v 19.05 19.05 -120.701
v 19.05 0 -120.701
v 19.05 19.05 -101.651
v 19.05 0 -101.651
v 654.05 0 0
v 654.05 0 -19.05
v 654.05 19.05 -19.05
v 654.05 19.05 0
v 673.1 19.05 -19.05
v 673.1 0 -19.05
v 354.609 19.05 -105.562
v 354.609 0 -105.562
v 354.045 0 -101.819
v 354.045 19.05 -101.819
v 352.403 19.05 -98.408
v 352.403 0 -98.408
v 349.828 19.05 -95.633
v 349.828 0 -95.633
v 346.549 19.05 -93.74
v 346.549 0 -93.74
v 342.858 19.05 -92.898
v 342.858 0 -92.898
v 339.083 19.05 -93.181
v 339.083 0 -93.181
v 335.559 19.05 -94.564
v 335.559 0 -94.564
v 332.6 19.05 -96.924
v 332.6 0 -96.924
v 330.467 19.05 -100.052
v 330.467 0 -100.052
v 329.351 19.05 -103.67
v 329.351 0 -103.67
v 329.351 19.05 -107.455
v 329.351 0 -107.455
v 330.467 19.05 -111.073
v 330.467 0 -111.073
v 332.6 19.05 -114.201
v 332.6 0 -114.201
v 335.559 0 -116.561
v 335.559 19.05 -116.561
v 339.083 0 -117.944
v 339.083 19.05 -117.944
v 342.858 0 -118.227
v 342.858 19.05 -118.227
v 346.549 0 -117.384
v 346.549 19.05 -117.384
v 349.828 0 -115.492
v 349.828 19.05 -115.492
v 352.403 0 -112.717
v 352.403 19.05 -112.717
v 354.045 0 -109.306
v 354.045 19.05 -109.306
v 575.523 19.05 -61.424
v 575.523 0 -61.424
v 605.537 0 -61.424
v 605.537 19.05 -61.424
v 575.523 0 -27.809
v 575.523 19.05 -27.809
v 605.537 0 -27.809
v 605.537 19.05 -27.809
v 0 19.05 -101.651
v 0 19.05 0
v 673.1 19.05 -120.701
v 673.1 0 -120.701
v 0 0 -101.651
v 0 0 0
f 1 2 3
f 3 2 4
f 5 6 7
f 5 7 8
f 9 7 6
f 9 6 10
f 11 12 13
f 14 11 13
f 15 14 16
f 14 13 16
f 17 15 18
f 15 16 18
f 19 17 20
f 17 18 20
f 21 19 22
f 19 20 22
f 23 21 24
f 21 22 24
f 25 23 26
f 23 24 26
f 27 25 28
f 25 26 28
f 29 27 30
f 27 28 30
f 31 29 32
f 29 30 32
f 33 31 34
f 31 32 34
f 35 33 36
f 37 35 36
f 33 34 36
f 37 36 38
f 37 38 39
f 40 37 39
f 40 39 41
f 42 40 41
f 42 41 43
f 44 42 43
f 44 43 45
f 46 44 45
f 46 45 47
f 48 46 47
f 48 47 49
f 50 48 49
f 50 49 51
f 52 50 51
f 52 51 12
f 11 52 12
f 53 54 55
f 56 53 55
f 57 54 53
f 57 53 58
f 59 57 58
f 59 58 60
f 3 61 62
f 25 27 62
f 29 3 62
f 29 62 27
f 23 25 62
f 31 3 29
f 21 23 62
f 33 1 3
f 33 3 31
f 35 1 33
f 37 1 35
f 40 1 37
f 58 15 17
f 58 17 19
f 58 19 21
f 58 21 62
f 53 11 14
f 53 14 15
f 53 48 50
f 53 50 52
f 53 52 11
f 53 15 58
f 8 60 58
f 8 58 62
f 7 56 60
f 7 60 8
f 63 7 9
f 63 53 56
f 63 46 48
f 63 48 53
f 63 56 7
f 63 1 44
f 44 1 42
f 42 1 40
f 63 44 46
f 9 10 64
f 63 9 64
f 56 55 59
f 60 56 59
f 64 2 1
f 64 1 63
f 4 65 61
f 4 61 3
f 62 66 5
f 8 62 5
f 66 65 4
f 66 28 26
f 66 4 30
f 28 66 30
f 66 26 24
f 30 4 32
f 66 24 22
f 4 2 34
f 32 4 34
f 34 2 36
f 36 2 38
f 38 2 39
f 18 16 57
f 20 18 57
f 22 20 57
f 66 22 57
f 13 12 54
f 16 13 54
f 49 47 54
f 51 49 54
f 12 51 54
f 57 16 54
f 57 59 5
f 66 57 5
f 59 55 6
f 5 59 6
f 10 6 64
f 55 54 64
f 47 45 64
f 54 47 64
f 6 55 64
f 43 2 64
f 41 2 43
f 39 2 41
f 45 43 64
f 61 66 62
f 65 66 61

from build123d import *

# Parameters (mm, degrees)
SKETCH1_W           = 673.1
SKETCH1_H           = 120.7008
BOSS_EXTRUDE1_DEPTH = 19.05
SKETCH3_W           = 30.013638179
SKETCH3_H           = 33.61527476
CUT_EXTRUDE5_DEPTH  = 20.05
SKETCH2_R           = 12.7
CUT_EXTRUDE4_DEPTH  = 20.05
SKETCH4_W           = 19.05
SKETCH4_H           = 19.05
CUT_EXTRUDE6_DEPTH  = 20.05


with BuildPart() as part:
    # Sketch1 → Boss-Extrude1 (new body)
    with BuildSketch(Plane(origin=(0, 0, 0), x_dir=(1, 0, 0), z_dir=(0, 1, 0))):
        with Locations((336.55, 60.3504)):
            Rectangle(SKETCH1_W, SKETCH1_H)
    extrude(amount=BOSS_EXTRUDE1_DEPTH)

    # Sketch3 → Cut-Extrude5 (cut, through all)
    with BuildSketch(Plane.XZ):
        with Locations((590.529823595, -44.616403279)):
            Rectangle(SKETCH3_W, SKETCH3_H)
    extrude(amount=-CUT_EXTRUDE5_DEPTH, mode=Mode.SUBTRACT)

    # Sketch2 → Cut-Extrude4 (cut, through all)
    with BuildSketch(Plane.XZ):
        with Locations((341.9094, -105.5624)):
            Circle(SKETCH2_R)
    extrude(amount=-CUT_EXTRUDE4_DEPTH, mode=Mode.SUBTRACT)

    # Sketch4 → Cut-Extrude6 (cut, through all)
    with BuildSketch(Plane.XZ):
        with Locations((663.575, -9.525)):
            Rectangle(SKETCH4_W, SKETCH4_H)
        with Locations((9.525, -111.1758)):
            Rectangle(SKETCH4_W, SKETCH4_H)
    extrude(amount=-CUT_EXTRUDE6_DEPTH, mode=Mode.SUBTRACT)


solid = part.part
